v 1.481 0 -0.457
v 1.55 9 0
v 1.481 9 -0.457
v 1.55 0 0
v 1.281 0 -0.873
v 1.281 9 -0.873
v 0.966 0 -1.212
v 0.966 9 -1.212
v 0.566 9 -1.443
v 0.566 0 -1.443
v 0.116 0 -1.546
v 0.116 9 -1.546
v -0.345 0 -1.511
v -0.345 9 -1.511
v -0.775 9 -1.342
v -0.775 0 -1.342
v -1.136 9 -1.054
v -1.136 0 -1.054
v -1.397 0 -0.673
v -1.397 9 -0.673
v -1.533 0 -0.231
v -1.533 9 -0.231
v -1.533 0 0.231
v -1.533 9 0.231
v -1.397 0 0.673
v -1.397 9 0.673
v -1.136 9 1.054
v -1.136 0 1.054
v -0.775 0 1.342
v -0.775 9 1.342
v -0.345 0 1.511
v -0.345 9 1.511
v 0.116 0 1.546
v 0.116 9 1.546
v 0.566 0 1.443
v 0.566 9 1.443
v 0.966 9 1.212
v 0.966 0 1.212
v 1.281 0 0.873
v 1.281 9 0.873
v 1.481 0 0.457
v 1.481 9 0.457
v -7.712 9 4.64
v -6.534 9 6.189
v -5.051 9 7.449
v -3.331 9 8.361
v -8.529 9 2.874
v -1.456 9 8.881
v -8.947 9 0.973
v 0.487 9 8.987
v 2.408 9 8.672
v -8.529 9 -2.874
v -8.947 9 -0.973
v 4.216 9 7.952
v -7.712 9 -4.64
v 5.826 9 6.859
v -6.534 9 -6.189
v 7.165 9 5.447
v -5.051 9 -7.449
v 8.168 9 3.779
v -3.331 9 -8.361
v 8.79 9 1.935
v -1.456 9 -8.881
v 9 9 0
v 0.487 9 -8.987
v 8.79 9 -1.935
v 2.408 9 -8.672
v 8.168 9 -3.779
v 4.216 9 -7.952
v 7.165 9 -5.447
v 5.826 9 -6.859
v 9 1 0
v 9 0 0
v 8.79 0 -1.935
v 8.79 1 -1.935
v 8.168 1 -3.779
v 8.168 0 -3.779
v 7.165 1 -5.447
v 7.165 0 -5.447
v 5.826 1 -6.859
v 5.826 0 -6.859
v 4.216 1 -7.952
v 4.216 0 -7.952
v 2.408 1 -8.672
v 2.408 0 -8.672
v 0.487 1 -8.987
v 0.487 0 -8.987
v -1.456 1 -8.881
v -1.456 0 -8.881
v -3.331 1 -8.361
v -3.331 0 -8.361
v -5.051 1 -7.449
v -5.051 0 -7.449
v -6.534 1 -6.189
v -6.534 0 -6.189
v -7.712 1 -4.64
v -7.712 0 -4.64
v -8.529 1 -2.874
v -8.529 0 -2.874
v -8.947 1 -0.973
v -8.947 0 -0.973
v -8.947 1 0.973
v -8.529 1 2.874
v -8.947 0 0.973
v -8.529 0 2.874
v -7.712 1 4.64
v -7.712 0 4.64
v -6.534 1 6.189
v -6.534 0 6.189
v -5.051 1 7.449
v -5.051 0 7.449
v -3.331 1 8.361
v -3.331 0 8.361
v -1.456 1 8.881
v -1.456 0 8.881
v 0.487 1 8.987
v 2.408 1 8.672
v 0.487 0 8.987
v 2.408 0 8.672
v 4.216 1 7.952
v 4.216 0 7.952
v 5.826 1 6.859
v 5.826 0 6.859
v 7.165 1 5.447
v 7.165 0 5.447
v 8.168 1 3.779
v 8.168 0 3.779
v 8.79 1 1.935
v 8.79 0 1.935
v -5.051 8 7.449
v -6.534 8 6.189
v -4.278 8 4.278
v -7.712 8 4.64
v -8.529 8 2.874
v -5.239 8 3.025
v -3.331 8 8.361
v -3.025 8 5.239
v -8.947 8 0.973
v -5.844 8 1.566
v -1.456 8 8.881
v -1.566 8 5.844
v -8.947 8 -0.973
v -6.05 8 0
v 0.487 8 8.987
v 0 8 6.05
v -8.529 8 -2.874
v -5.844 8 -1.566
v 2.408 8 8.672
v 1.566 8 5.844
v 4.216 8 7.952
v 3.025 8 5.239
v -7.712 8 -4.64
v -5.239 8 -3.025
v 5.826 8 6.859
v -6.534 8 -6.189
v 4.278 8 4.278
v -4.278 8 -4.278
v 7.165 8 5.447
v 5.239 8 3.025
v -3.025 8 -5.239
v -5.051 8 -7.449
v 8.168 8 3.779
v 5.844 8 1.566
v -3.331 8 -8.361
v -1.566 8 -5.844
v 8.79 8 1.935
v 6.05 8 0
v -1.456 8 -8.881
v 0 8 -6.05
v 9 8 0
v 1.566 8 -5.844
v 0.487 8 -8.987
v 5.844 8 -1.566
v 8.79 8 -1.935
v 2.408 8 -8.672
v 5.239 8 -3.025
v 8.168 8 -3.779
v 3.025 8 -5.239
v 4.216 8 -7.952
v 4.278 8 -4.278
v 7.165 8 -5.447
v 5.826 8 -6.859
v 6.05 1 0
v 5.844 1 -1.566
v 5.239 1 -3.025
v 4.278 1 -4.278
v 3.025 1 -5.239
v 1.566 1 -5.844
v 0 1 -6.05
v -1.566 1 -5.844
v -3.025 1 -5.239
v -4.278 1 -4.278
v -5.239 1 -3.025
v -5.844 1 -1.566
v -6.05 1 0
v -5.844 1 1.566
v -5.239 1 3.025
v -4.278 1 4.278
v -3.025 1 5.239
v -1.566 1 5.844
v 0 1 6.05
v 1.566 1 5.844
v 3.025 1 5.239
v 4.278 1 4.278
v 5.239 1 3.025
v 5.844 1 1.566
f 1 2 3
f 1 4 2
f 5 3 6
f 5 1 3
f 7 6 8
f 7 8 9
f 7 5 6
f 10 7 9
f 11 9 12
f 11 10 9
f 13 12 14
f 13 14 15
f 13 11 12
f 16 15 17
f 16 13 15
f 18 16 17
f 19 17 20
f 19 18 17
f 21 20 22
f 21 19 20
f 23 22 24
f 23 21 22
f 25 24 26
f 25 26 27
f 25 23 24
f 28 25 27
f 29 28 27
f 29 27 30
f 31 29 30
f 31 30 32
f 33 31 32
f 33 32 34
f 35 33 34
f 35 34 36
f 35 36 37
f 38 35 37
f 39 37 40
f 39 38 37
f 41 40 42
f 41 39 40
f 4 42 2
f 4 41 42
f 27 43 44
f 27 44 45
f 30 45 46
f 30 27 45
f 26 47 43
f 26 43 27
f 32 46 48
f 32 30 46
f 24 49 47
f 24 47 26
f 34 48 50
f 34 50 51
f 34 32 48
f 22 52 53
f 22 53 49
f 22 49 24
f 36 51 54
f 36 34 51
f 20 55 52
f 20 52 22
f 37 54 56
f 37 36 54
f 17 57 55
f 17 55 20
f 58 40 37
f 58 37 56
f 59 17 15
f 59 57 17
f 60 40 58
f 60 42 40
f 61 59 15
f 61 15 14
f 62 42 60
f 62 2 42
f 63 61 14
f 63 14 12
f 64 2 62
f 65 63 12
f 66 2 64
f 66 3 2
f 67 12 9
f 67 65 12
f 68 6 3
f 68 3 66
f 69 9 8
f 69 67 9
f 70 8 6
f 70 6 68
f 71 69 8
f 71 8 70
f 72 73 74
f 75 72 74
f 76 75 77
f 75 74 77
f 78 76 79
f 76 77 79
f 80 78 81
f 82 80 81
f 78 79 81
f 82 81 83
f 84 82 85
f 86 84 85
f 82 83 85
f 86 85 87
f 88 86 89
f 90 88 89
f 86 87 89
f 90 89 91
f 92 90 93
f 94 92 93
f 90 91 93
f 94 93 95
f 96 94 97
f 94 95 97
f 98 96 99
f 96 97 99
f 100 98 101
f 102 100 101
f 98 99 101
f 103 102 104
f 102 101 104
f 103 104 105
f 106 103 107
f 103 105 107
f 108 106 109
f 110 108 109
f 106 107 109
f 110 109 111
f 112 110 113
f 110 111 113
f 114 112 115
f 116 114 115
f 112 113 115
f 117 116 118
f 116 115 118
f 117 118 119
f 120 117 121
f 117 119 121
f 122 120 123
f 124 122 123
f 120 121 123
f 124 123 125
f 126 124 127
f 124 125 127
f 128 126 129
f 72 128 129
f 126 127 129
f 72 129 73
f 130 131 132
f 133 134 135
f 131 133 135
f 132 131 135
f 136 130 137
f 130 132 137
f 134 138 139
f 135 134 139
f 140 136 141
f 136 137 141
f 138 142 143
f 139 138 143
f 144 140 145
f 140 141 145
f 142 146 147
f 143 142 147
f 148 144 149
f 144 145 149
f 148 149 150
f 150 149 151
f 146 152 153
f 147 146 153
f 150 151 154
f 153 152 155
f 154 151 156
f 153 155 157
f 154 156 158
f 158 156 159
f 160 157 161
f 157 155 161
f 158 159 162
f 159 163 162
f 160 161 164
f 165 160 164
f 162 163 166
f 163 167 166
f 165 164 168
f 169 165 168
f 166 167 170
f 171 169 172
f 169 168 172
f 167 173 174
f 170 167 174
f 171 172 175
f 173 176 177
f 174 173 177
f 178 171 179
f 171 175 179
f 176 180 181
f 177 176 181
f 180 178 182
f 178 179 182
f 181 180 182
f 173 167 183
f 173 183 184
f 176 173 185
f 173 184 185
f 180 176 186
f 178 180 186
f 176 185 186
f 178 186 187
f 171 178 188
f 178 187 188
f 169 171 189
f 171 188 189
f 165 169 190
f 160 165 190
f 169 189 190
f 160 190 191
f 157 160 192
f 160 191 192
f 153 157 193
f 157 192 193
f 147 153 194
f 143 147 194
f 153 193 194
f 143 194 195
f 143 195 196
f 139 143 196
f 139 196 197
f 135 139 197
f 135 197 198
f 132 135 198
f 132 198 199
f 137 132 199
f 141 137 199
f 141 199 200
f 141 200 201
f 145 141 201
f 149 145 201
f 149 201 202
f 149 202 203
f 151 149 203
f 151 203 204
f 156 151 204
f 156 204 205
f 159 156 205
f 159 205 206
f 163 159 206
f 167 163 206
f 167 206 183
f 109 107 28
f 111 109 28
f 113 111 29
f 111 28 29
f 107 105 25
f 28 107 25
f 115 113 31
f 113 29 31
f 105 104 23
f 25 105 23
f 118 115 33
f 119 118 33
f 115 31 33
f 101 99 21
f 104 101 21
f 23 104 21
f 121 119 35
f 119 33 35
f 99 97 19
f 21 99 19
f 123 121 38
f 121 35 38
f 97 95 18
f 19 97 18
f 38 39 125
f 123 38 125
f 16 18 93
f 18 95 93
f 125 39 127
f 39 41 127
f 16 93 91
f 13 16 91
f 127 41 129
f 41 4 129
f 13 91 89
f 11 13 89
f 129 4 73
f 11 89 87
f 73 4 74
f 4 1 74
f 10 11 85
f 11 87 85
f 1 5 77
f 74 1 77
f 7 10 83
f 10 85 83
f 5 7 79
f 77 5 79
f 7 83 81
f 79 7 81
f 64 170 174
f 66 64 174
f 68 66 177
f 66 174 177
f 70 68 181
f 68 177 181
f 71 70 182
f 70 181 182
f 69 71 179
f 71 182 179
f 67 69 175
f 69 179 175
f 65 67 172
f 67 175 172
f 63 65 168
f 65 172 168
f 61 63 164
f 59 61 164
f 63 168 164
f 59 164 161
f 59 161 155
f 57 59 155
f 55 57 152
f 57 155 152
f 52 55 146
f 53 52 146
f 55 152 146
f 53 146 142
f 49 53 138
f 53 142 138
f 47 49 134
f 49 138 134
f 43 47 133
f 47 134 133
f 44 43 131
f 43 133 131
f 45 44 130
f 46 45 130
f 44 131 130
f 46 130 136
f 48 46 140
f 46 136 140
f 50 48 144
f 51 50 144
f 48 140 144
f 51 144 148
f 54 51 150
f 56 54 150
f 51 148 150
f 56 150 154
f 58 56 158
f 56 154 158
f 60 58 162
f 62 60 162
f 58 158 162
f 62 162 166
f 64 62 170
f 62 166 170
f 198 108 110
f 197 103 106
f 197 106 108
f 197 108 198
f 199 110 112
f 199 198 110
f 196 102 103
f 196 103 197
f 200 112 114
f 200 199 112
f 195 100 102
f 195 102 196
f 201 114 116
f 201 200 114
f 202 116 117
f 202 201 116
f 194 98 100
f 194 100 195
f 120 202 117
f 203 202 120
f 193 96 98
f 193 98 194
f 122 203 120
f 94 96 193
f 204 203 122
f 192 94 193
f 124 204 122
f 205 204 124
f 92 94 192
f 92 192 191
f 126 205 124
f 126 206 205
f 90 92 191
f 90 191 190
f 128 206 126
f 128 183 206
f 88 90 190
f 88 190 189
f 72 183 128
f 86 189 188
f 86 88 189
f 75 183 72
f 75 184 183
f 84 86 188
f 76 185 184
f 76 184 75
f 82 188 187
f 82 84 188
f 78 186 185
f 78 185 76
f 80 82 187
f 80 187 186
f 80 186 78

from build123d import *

# Parameters (mm, degrees)
CROQUIS1_R              = 9
CROQUIS1_R_2            = 1.55
SALIENTE_EXTRUIR1_DEPTH = 1
CROQUIS1_3_R            = 6.05
CROQUIS1_3_R_2          = 1.55
SALIENTE_EXTRUIR2_DEPTH = 8
CROQUIS2_R              = 9
CROQUIS2_R_2            = 1.55
SALIENTE_EXTRUIR3_DEPTH = 1


with BuildPart() as part:
    # Croquis1 → Saliente-Extruir1 (new body)
    with BuildSketch(Plane(origin=(0, 0, 0), x_dir=(1, 0, 0), z_dir=(0, 1, 0))):
        Circle(CROQUIS1_R)
        Circle(CROQUIS1_R_2, mode=Mode.SUBTRACT)
    extrude(amount=SALIENTE_EXTRUIR1_DEPTH)

    # Croquis1<3> → Saliente-Extruir2 (add)
    with BuildSketch(Plane(origin=(0, 0, 0), x_dir=(1, 0, 0), z_dir=(0, 1, 0))):
        Circle(CROQUIS1_3_R)
        Circle(CROQUIS1_3_R_2, mode=Mode.SUBTRACT)
    extrude(amount=SALIENTE_EXTRUIR2_DEPTH)

    # Croquis2 → Saliente-Extruir3 (add)
    with BuildSketch(Plane(origin=(0, 8, 0), x_dir=(1, 0, 0), z_dir=(0, 1, 0))):
        Circle(CROQUIS2_R)
        Circle(CROQUIS2_R_2, mode=Mode.SUBTRACT)
    extrude(amount=SALIENTE_EXTRUIR3_DEPTH)


solid = part.part
